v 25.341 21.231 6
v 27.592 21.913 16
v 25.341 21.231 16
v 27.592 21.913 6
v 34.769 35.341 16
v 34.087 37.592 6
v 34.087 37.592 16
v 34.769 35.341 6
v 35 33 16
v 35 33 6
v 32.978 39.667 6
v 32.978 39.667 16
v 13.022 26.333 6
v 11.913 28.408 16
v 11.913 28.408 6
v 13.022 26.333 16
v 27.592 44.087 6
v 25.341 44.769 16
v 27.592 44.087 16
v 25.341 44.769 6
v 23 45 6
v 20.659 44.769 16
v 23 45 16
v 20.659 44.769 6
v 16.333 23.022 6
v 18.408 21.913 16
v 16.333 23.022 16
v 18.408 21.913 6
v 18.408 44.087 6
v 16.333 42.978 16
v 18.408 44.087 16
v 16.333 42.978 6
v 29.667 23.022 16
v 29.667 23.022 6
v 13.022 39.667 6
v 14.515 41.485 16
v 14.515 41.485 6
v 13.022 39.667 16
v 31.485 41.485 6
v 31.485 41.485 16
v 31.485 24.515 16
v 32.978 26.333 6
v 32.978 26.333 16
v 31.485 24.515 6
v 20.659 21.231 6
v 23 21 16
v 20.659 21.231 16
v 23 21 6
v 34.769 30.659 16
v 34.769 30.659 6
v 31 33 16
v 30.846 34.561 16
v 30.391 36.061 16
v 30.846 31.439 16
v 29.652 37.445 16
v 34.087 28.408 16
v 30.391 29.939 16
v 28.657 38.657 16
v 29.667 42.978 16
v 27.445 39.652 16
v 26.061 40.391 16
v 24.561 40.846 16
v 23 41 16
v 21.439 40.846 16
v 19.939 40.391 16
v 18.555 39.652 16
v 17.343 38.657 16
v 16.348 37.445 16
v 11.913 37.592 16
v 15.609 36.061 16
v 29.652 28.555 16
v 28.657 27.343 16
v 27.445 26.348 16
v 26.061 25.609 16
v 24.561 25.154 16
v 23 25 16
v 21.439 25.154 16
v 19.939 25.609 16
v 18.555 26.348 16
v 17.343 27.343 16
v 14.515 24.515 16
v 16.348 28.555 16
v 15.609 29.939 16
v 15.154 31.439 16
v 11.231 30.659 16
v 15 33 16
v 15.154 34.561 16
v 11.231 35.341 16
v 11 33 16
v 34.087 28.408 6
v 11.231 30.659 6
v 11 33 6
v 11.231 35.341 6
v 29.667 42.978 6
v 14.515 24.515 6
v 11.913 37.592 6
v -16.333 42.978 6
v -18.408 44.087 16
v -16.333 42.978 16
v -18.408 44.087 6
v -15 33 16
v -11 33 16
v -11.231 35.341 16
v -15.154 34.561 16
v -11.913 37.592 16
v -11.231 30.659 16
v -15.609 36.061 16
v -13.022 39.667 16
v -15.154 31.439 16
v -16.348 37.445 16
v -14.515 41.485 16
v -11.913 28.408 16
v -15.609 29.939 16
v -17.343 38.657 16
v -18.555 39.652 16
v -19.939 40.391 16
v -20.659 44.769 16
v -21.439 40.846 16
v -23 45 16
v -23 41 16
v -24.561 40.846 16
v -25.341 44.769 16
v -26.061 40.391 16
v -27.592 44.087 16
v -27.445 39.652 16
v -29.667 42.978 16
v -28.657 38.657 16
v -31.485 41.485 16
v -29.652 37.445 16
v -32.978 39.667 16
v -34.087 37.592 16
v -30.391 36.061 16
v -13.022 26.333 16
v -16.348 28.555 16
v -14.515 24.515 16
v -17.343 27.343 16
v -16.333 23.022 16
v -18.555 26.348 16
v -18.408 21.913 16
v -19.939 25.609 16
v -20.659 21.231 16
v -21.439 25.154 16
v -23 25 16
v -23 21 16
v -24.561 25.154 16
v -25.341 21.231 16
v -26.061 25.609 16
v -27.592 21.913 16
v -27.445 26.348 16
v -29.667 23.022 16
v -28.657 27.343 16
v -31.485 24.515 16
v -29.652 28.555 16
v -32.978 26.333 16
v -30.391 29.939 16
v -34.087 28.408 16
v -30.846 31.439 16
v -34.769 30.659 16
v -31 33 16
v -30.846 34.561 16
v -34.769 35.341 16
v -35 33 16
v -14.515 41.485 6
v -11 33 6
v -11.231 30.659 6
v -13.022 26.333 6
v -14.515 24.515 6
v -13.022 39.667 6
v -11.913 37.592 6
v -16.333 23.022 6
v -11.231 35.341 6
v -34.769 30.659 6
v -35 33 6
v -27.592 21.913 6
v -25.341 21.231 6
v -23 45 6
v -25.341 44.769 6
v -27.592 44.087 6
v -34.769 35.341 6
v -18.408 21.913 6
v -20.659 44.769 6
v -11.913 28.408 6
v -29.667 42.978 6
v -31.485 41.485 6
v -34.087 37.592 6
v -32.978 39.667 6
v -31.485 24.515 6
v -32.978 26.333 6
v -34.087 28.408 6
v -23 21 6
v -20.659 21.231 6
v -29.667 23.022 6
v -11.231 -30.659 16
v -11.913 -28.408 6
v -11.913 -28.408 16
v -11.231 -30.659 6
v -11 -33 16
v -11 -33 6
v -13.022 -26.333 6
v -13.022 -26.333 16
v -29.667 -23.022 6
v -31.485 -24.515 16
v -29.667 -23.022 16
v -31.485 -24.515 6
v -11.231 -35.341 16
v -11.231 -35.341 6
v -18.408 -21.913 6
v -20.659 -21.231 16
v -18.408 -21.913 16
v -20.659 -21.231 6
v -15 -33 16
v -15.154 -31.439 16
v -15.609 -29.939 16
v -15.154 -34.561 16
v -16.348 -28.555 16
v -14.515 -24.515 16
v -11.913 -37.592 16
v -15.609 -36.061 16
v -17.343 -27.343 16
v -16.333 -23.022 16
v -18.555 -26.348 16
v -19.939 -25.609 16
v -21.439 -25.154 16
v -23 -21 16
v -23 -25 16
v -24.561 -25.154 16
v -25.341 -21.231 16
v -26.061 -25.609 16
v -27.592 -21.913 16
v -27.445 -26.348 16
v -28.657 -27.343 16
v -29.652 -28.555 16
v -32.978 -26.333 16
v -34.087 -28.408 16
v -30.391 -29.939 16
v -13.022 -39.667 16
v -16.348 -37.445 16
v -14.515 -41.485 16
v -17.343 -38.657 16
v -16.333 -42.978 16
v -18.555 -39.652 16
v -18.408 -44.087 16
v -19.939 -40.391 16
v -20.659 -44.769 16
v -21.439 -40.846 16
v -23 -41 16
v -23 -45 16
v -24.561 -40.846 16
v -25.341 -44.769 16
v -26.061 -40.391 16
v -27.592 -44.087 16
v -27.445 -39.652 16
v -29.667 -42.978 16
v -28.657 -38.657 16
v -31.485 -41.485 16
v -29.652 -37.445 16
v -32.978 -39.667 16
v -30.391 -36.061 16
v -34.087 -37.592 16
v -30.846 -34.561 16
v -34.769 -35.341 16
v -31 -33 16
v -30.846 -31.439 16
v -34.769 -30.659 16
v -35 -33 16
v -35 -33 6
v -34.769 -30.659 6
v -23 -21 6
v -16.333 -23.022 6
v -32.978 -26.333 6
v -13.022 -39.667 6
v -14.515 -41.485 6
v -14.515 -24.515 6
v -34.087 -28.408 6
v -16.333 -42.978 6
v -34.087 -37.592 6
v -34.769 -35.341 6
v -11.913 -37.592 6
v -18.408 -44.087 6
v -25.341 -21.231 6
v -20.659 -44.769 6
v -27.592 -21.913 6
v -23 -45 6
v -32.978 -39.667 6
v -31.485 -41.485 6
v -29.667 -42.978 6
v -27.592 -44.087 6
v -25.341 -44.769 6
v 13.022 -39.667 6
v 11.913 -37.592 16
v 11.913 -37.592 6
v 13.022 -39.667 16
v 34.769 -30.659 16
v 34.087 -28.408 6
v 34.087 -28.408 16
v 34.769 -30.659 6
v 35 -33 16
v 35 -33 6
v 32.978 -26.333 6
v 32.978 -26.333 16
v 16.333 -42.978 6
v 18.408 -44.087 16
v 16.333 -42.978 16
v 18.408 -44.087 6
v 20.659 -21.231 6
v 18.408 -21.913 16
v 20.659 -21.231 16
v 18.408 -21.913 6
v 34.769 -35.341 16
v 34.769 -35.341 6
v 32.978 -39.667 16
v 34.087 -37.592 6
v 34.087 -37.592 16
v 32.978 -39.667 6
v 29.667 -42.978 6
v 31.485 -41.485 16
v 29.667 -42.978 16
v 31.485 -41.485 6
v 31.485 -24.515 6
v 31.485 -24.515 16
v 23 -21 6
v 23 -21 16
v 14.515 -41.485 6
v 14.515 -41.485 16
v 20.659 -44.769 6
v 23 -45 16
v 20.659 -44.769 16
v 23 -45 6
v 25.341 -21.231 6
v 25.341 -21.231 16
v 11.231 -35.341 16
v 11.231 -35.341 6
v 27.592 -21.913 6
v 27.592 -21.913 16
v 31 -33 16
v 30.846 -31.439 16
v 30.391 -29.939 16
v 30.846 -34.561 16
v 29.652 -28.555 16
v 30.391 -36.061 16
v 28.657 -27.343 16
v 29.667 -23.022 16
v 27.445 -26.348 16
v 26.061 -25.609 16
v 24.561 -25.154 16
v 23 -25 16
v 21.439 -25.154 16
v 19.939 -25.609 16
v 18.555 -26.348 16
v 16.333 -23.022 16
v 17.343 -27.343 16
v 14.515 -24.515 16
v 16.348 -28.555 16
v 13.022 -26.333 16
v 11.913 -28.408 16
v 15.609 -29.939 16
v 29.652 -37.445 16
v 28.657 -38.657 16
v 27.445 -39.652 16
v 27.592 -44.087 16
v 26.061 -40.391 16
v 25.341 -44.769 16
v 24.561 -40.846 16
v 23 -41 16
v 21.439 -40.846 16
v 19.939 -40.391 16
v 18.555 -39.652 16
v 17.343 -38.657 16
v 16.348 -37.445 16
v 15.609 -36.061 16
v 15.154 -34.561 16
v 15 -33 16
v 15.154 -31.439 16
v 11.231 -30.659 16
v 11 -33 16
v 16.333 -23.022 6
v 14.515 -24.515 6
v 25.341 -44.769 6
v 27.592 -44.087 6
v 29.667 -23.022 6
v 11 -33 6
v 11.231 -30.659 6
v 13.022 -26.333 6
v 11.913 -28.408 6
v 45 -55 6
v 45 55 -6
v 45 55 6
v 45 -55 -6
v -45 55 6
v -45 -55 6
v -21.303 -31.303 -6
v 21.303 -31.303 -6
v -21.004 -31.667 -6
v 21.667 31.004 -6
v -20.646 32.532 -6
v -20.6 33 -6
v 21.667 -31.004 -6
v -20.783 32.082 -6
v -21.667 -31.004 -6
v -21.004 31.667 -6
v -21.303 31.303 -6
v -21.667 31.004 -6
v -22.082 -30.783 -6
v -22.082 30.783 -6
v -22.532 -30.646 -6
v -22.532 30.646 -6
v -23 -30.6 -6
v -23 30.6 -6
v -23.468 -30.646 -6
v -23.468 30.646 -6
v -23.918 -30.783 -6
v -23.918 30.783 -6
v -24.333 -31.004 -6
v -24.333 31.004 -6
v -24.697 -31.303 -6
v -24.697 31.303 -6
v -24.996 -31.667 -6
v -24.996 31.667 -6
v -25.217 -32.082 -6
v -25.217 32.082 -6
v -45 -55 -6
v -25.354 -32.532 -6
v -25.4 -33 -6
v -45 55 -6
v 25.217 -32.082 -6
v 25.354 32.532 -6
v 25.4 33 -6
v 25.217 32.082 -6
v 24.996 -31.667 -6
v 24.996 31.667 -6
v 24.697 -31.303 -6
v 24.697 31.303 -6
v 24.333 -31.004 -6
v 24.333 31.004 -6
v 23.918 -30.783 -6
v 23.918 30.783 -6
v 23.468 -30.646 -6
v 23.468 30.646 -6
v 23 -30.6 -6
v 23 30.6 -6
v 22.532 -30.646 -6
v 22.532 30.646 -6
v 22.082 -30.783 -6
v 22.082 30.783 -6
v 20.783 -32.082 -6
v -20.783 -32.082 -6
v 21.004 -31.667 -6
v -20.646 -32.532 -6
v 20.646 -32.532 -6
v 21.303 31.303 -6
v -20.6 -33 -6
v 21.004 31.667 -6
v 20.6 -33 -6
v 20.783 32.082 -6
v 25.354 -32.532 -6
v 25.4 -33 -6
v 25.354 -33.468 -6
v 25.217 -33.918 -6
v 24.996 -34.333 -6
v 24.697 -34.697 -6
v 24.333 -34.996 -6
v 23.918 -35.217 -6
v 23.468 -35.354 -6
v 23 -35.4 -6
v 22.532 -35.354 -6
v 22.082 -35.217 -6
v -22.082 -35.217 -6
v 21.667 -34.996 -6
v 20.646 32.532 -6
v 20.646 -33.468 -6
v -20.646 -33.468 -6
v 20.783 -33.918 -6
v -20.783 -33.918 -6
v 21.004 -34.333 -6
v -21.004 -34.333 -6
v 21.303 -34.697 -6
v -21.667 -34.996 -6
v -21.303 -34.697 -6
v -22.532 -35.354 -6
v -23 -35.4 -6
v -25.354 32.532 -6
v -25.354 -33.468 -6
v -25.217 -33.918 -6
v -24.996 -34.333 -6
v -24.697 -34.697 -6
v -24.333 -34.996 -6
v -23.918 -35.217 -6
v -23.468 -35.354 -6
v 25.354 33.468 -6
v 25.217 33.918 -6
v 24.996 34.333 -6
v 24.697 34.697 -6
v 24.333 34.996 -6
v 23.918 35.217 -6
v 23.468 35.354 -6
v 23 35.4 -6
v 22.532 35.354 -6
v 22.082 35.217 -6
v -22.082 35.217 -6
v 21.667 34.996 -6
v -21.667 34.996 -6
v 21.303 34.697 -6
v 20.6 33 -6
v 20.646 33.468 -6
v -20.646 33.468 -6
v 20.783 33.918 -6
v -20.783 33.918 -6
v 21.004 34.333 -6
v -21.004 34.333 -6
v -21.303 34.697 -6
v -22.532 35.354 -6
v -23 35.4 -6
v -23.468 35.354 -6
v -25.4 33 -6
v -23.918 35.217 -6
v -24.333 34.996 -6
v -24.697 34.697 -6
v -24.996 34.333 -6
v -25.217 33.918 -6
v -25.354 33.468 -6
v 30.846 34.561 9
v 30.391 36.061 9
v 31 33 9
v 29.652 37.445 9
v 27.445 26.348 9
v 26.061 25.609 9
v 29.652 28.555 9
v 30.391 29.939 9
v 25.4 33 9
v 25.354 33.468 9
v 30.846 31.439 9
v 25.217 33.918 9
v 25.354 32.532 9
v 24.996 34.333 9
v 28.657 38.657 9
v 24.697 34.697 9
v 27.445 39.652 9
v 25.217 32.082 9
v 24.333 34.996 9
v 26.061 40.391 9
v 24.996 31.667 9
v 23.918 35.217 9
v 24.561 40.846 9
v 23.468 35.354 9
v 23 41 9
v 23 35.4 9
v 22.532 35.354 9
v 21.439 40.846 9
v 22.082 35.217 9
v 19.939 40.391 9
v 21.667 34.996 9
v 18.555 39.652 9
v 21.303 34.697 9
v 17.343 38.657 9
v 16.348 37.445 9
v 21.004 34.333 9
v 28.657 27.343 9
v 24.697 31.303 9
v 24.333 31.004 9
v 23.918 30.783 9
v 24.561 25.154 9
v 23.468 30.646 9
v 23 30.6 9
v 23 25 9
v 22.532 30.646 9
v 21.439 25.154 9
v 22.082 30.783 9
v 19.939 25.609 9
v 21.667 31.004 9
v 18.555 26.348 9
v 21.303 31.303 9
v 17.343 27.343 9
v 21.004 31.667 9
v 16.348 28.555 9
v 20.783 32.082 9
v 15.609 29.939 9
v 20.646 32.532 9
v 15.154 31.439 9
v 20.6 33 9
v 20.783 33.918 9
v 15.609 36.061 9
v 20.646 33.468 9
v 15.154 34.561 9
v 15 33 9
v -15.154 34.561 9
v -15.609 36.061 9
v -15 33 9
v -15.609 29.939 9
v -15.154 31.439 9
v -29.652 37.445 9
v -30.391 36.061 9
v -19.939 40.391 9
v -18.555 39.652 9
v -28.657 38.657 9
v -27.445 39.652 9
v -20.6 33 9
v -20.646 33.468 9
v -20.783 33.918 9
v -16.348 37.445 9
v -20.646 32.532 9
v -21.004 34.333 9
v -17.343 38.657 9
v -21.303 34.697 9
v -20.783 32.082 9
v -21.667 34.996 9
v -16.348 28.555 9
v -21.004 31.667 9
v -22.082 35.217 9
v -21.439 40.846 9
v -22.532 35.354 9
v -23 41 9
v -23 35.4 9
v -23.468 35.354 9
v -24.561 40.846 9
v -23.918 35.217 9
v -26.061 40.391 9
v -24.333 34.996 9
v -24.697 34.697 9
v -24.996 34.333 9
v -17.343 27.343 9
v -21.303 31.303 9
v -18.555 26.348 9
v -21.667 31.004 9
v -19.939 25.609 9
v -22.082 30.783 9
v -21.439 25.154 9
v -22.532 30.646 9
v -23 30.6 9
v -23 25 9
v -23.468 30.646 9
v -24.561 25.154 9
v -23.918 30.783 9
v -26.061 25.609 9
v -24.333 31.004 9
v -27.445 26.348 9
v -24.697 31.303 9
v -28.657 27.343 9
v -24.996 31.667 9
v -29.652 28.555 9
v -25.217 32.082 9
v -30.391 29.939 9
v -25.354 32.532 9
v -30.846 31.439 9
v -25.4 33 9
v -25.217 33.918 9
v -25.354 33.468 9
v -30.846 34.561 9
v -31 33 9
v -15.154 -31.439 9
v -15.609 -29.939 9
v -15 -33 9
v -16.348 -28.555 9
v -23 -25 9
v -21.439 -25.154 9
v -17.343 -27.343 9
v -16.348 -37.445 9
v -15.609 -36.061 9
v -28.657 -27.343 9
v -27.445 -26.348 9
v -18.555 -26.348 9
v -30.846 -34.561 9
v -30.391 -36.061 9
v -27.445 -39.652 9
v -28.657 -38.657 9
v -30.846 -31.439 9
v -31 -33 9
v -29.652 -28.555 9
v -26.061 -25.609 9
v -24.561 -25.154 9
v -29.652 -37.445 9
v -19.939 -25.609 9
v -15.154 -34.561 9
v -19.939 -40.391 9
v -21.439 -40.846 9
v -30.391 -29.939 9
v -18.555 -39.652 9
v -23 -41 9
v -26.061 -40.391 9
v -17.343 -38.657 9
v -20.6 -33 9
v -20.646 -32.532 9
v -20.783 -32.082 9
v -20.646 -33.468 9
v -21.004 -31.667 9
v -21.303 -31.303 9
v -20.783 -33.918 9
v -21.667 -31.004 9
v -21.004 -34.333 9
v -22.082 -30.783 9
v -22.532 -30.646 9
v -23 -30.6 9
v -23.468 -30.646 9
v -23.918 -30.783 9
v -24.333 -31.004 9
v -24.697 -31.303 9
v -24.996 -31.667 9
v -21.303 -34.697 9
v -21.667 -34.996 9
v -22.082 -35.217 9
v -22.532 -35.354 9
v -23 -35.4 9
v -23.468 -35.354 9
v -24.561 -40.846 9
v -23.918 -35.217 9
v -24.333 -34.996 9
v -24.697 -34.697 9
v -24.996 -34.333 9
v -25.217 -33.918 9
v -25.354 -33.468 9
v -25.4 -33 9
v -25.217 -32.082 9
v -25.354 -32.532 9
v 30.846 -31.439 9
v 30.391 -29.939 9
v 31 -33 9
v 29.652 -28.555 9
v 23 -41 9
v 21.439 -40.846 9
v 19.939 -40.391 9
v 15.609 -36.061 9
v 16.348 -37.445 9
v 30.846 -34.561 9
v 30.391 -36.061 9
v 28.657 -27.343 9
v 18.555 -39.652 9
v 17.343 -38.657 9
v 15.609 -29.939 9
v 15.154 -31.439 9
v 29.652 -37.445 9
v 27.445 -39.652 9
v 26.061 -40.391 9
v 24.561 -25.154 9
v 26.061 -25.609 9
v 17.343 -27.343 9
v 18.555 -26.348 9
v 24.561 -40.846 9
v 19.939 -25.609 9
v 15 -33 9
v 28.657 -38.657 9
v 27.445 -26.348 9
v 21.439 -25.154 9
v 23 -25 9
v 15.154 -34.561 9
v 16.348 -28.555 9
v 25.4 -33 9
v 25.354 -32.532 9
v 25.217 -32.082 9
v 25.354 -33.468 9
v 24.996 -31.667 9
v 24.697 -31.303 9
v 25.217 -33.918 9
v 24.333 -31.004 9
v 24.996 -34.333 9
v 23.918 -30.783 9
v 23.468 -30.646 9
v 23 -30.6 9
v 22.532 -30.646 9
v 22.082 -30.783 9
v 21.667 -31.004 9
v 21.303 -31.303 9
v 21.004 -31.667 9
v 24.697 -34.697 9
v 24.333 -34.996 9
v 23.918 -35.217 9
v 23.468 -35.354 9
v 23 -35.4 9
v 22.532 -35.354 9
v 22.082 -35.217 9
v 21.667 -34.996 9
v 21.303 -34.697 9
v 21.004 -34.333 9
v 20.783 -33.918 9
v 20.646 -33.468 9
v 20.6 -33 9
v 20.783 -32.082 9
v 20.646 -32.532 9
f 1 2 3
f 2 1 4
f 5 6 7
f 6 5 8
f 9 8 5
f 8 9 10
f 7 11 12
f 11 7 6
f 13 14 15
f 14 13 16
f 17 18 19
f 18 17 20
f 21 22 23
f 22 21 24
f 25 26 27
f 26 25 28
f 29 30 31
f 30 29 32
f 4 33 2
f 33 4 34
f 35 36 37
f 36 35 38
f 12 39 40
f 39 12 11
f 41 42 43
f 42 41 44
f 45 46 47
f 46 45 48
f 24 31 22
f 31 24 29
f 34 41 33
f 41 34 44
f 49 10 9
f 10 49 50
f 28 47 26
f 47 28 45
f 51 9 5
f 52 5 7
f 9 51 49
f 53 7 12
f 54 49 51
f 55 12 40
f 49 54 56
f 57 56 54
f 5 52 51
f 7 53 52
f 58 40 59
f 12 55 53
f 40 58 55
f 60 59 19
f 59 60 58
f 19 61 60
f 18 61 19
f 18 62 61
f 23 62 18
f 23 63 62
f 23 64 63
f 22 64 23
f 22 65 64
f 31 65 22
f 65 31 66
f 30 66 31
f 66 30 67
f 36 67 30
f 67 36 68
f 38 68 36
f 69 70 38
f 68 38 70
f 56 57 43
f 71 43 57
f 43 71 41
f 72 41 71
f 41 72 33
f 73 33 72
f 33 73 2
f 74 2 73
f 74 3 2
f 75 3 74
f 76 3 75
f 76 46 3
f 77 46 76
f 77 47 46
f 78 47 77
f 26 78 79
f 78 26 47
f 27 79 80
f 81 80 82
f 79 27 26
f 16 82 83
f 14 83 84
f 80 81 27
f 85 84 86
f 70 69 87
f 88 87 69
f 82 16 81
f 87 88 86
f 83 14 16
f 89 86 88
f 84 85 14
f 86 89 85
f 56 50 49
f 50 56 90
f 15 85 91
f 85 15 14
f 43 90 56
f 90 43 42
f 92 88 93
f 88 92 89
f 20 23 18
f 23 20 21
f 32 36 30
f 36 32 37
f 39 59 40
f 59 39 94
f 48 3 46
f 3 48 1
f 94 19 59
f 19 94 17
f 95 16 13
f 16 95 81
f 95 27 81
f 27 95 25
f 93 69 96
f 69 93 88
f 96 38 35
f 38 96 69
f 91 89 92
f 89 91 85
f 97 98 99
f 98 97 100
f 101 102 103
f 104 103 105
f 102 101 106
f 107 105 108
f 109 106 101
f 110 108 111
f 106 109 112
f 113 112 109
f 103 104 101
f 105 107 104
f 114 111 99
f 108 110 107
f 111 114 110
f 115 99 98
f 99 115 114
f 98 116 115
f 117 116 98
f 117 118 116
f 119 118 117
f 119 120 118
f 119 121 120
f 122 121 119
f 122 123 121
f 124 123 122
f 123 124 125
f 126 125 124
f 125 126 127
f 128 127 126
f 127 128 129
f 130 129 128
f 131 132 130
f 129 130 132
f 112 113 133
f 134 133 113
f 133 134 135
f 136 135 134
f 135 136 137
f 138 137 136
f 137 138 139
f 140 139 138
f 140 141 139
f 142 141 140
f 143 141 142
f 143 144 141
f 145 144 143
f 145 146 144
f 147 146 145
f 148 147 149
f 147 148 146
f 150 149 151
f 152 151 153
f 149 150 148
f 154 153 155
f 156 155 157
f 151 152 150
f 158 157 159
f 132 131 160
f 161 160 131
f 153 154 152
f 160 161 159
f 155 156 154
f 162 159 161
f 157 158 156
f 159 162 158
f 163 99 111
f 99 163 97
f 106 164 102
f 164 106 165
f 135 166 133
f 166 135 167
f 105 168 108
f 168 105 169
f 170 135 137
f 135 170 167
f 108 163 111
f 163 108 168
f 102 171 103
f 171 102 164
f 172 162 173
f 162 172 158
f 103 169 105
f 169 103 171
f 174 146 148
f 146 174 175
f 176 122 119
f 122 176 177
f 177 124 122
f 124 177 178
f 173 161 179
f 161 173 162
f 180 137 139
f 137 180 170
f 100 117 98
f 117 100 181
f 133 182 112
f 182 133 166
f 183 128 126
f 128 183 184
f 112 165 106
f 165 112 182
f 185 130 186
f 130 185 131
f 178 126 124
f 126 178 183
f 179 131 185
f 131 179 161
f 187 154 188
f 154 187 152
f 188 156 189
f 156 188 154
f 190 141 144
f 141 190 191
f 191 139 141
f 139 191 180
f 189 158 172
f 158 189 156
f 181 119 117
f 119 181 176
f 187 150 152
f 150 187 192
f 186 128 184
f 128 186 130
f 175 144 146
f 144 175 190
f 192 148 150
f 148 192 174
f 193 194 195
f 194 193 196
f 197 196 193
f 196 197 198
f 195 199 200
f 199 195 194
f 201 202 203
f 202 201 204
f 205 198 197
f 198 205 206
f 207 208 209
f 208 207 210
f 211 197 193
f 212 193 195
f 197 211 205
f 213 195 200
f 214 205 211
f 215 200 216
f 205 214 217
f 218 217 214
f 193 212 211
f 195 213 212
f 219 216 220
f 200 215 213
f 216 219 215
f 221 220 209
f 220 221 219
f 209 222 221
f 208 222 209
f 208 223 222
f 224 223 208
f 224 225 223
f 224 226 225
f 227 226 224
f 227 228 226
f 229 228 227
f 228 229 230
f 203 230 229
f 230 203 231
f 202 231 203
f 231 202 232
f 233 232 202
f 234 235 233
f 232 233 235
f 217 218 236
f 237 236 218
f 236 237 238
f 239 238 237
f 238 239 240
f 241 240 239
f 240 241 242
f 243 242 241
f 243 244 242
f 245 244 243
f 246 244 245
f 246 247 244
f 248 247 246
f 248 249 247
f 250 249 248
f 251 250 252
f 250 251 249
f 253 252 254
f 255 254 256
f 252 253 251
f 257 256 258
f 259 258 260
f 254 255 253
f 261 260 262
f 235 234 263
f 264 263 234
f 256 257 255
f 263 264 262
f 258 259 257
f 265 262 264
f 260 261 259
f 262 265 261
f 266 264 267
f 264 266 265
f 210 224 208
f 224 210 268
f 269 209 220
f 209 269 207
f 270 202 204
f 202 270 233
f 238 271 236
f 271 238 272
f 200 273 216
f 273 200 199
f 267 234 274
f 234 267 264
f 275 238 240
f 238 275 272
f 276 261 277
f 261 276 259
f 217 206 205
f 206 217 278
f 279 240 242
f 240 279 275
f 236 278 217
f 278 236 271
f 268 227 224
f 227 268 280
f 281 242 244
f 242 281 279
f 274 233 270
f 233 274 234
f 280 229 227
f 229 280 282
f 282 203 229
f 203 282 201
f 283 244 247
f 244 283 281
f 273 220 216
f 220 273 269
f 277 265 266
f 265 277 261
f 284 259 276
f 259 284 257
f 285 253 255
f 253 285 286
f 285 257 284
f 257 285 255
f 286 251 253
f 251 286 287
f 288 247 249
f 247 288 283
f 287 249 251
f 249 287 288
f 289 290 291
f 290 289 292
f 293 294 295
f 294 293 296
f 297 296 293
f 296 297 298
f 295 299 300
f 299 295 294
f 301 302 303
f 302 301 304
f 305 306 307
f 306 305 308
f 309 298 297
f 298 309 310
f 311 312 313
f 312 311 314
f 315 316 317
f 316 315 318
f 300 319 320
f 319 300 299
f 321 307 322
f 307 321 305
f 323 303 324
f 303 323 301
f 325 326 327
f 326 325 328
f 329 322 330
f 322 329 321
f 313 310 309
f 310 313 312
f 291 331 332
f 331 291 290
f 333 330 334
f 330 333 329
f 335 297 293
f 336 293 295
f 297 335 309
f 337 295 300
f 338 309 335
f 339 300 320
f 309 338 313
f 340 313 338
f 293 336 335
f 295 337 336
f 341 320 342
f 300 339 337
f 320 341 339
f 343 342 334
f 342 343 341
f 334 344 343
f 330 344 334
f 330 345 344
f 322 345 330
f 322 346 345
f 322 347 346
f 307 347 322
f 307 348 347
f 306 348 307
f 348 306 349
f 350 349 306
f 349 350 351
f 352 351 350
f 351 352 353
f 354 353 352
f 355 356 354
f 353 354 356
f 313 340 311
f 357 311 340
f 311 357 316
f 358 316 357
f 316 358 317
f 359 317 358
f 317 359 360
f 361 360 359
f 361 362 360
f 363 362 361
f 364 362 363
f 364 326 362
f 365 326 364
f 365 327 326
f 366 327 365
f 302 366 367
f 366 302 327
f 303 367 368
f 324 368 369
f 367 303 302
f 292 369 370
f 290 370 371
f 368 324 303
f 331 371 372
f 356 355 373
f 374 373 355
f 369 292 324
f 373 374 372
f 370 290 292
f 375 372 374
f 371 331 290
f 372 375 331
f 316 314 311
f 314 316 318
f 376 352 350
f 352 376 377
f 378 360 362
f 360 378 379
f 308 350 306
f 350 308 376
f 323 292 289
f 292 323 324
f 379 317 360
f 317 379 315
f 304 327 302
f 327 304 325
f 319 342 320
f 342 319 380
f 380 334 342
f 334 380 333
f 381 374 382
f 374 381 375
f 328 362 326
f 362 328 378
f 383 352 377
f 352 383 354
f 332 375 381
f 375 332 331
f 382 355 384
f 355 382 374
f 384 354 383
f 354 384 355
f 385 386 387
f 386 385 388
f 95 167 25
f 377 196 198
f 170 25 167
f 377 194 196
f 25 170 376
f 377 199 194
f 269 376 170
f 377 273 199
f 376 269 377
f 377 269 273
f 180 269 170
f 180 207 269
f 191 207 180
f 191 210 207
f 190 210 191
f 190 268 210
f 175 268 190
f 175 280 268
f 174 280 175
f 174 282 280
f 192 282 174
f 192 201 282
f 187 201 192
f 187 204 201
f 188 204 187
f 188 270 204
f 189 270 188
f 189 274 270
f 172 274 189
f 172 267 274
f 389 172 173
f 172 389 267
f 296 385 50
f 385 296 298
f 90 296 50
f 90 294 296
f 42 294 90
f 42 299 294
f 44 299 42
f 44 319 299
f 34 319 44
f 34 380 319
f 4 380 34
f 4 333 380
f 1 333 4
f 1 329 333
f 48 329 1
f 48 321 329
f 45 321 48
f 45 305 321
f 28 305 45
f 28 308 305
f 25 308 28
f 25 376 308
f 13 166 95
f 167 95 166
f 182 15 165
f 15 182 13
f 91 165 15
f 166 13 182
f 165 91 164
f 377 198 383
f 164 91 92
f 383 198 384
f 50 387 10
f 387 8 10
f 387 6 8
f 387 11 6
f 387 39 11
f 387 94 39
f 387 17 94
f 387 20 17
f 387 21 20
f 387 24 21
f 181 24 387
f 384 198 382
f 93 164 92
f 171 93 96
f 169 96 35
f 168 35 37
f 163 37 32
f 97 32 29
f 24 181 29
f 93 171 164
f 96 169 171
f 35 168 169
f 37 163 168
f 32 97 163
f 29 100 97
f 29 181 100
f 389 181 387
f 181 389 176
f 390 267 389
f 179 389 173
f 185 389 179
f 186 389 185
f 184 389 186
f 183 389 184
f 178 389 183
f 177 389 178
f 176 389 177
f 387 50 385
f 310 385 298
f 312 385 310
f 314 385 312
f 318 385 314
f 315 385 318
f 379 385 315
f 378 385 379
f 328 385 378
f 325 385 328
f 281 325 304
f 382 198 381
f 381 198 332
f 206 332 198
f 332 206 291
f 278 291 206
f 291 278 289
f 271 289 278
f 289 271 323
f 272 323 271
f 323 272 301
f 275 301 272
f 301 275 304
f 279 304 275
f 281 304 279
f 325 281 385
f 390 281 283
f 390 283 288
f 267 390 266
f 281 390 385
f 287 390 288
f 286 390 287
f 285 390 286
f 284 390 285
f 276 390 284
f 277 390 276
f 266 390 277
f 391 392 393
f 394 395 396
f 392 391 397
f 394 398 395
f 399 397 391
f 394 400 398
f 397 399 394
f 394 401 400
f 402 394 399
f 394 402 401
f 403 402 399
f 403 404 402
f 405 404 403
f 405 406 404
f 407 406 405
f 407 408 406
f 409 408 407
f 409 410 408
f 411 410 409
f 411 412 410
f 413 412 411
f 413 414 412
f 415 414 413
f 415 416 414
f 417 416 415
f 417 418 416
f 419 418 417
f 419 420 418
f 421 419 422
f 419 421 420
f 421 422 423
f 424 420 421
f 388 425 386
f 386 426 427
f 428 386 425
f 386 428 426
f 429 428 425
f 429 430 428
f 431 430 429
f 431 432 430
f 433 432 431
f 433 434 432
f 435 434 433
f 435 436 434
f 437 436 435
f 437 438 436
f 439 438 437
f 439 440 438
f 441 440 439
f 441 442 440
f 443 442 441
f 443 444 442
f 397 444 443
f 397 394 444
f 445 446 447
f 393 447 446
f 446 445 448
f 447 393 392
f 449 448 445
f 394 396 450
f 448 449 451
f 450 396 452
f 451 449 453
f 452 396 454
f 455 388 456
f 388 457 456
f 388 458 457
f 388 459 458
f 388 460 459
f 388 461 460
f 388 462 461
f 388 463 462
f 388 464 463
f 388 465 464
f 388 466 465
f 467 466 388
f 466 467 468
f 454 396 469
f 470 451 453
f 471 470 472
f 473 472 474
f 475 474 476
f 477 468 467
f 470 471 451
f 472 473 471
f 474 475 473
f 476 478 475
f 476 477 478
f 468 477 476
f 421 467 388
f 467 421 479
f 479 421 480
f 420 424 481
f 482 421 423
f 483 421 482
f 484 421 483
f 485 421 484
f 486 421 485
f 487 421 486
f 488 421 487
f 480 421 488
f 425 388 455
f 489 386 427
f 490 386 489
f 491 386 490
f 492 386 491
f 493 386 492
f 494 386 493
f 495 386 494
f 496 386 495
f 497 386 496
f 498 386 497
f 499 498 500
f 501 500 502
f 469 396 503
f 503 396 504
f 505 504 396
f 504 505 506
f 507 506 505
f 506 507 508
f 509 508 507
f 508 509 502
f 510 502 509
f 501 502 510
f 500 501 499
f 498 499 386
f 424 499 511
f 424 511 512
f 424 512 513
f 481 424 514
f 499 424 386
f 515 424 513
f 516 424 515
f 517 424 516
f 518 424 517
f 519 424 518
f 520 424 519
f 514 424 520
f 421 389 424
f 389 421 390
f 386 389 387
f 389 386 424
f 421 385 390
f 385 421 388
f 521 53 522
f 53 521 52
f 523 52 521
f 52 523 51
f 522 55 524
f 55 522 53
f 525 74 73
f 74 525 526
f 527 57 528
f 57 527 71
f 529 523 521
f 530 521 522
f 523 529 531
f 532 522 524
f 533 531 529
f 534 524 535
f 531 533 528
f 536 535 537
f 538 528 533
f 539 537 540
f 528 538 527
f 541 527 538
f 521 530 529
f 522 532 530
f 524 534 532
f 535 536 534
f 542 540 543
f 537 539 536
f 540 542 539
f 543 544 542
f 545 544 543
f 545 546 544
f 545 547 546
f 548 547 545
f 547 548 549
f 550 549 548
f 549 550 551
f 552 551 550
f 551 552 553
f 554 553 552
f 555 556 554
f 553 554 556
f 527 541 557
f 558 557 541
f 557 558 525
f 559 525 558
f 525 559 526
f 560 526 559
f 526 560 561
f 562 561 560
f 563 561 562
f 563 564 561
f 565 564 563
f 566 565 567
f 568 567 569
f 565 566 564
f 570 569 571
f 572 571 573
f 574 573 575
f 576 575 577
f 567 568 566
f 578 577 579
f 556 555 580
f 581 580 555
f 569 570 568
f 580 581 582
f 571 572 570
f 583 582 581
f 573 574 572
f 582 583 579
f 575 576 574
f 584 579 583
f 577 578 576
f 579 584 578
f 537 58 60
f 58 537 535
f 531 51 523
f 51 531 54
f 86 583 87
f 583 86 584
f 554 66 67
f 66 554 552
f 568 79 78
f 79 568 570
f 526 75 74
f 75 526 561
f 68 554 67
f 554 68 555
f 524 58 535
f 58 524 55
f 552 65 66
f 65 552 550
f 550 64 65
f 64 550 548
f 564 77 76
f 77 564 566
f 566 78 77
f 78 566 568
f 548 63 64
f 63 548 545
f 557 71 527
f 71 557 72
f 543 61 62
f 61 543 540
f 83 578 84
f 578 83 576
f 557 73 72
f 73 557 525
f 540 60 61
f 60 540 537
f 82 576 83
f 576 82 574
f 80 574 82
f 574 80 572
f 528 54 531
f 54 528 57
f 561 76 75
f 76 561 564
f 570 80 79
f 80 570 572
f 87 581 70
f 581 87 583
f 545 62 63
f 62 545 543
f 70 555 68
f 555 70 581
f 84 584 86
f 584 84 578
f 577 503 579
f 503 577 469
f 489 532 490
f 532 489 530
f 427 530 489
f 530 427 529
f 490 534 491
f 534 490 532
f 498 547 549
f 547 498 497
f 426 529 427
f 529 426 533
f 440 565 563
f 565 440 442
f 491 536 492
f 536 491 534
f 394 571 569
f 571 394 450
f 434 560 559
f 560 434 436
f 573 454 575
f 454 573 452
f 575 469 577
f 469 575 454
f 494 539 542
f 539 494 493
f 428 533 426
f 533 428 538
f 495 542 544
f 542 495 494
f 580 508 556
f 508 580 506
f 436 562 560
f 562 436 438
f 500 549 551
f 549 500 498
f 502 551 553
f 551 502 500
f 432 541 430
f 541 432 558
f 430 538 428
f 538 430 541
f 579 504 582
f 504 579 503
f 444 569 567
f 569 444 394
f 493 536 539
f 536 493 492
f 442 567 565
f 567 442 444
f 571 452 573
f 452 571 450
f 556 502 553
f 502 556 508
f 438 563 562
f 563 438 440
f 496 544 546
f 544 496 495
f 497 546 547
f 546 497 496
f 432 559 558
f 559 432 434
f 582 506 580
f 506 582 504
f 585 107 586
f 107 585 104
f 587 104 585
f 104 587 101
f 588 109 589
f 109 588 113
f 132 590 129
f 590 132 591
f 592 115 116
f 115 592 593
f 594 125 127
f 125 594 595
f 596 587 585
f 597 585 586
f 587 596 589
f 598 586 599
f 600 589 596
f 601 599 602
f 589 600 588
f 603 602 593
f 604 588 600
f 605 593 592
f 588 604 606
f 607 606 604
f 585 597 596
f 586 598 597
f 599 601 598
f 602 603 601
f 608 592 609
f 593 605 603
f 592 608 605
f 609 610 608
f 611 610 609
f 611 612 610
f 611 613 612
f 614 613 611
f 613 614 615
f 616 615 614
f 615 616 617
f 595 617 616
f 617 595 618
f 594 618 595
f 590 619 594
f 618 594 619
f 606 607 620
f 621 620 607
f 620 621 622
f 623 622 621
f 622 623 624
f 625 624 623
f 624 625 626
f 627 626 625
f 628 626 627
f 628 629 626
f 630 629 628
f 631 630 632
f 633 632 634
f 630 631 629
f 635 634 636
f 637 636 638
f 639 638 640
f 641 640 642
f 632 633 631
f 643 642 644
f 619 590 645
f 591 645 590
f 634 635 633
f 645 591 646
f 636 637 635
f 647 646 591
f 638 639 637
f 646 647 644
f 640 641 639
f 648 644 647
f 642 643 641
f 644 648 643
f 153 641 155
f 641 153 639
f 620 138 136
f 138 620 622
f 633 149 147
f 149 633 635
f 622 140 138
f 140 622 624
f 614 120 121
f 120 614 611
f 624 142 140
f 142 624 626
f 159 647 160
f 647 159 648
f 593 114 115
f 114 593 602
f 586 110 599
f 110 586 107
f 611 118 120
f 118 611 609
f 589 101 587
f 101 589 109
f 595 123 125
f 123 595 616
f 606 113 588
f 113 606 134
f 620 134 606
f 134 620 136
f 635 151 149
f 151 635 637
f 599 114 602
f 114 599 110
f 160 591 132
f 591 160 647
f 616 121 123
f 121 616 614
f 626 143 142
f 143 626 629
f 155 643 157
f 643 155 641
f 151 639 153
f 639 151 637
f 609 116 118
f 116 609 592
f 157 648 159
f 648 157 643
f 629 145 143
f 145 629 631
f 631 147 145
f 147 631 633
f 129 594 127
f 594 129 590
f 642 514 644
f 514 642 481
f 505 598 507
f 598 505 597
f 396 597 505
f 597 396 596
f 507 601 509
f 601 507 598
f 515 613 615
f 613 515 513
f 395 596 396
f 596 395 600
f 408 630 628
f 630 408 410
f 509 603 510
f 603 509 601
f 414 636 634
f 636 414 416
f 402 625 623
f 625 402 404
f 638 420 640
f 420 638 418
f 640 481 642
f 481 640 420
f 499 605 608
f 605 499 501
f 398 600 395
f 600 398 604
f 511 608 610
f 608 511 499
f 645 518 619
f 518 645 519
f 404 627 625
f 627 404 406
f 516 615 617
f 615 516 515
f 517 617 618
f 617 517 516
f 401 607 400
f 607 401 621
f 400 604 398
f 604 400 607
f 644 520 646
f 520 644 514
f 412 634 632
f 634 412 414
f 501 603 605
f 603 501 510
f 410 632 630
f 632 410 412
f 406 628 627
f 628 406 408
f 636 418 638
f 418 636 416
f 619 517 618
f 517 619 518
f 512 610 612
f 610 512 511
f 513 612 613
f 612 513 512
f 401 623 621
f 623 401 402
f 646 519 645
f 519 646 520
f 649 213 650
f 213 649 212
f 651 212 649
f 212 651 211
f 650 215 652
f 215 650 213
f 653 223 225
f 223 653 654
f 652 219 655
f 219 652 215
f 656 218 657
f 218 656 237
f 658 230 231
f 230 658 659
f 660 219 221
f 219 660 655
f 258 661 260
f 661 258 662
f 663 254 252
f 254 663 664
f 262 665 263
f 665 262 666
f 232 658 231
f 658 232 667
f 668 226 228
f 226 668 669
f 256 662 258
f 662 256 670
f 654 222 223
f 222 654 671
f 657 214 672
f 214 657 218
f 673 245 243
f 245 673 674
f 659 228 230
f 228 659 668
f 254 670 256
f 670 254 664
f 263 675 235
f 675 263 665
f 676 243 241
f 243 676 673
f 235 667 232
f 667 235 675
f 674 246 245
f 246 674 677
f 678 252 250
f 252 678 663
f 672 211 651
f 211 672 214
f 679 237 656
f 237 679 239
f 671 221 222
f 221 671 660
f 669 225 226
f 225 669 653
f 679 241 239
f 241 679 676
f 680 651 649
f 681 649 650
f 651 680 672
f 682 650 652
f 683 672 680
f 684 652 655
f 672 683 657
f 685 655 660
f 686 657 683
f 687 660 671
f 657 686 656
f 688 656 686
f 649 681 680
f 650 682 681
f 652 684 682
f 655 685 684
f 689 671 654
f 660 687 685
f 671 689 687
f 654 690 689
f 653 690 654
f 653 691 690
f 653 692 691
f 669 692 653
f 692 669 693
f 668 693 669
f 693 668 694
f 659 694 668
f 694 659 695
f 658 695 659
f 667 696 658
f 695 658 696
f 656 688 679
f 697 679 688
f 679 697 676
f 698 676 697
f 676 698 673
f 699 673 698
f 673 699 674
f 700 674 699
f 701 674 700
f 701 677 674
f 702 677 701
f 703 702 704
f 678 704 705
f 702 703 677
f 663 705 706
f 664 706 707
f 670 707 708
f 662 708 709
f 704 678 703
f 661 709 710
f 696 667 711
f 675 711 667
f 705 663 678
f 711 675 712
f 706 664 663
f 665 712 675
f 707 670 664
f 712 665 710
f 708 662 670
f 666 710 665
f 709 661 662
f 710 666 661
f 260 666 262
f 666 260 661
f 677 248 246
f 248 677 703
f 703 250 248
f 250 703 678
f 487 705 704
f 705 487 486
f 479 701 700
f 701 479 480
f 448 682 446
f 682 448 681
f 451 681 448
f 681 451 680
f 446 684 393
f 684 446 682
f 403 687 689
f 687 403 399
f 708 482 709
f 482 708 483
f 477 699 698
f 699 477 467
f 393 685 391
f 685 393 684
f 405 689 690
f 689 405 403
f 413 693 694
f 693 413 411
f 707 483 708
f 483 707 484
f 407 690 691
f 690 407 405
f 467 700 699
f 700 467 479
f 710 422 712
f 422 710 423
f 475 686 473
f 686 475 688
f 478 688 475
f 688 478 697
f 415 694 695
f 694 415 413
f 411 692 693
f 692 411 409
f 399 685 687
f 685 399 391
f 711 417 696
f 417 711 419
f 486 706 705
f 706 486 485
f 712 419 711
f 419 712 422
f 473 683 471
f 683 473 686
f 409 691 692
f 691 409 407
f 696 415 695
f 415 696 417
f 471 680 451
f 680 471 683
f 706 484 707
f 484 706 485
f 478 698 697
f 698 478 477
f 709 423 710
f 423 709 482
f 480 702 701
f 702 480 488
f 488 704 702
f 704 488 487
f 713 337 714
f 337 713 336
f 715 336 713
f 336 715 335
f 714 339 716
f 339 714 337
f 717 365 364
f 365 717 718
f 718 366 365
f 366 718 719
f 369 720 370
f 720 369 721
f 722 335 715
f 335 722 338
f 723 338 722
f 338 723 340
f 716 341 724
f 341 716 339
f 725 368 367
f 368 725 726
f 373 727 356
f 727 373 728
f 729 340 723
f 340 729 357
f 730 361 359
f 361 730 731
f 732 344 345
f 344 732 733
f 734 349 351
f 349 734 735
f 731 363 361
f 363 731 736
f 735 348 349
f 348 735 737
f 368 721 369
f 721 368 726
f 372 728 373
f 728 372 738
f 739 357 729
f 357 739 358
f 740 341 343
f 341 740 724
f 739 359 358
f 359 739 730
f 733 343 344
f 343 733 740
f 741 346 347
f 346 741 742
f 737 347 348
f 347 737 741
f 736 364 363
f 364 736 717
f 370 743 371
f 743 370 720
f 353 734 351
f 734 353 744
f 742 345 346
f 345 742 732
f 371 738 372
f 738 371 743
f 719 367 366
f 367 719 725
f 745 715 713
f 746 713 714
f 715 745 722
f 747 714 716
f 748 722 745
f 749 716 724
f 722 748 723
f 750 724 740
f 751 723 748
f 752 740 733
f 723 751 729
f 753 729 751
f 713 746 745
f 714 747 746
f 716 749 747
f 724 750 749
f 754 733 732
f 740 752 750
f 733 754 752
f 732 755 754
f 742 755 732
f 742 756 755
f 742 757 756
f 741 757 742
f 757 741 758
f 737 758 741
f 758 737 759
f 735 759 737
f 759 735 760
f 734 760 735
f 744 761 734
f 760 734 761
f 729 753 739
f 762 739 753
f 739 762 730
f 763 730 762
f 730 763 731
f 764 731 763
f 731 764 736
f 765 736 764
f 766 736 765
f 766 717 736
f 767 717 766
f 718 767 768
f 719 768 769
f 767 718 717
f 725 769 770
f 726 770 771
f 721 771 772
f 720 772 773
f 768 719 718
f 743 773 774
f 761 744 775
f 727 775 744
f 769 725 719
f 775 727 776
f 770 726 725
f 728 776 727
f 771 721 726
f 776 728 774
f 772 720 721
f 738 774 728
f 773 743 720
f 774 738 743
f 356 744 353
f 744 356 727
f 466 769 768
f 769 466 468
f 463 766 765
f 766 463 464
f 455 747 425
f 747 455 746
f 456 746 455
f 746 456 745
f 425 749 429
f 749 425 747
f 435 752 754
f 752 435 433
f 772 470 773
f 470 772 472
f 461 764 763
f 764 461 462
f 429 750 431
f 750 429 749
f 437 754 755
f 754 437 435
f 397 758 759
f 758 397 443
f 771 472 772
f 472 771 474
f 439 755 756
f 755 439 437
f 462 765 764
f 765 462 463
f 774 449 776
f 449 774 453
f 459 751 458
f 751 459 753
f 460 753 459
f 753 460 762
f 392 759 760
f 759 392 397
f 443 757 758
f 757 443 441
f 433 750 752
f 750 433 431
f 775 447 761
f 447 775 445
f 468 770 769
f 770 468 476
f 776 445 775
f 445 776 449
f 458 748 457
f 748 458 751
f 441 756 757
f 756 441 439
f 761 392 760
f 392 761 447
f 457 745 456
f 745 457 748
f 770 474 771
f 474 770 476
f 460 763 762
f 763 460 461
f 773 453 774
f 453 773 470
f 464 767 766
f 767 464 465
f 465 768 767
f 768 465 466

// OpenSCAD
$fn = 32;

// ----------------------------------------------------------------------
// Socket pad plate
// bosses with counterbored sockets for the screws
// ----------------------------------------------------------------------

// --- parameters (mm) ---
base_t = 12;            // base plate thickness
boss_h = 10;            // boss height above the base plate
boss_d = 24;            // boss diameter
socket_d = 16;          // socket diameter
socket_depth = 7;       // socket depth from the boss face
bolt_d = 4.8;           // screw clearance hole through the socket floor
plate = [90, 110, 12];  // overall size (x, y, z)
edge = 22;              // boss centre offset from the plate edge
pads = 4;               // boss count, one per corner

// --- derived feature positions (mm) ---
height = base_t + boss_h;        // = 22   overall height of the part
corner_x = plate[0] / 2 - edge;  // = 23   boss centre X
corner_y = plate[1] / 2 - edge;  // = 33   boss centre Y
feature_centers = [
  [corner_x, corner_y],
  [-corner_x, corner_y],
  [-corner_x, -corner_y],
  [corner_x, -corner_y]
];   // boss centres: sockets, holes and the pads themselves are placed from here

// base plate, bosses on feature_centers, socket + through hole in each
difference() {
  union() {
    cube(plate, center = true);
    for (centre = feature_centers)
      translate([centre[0], centre[1], plate[2] / 2 - 1])
        cylinder(d = boss_d, h = boss_h + 1);
  }
  for (centre = feature_centers) {
    translate([centre[0], centre[1], plate[2] / 2 + boss_h - socket_depth])
      cylinder(d = socket_d, h = socket_depth + 1);
    translate([centre[0], centre[1], -height])
      cylinder(d = bolt_d, h = 2 * height + 2);  // through the socket floor
  }
}
